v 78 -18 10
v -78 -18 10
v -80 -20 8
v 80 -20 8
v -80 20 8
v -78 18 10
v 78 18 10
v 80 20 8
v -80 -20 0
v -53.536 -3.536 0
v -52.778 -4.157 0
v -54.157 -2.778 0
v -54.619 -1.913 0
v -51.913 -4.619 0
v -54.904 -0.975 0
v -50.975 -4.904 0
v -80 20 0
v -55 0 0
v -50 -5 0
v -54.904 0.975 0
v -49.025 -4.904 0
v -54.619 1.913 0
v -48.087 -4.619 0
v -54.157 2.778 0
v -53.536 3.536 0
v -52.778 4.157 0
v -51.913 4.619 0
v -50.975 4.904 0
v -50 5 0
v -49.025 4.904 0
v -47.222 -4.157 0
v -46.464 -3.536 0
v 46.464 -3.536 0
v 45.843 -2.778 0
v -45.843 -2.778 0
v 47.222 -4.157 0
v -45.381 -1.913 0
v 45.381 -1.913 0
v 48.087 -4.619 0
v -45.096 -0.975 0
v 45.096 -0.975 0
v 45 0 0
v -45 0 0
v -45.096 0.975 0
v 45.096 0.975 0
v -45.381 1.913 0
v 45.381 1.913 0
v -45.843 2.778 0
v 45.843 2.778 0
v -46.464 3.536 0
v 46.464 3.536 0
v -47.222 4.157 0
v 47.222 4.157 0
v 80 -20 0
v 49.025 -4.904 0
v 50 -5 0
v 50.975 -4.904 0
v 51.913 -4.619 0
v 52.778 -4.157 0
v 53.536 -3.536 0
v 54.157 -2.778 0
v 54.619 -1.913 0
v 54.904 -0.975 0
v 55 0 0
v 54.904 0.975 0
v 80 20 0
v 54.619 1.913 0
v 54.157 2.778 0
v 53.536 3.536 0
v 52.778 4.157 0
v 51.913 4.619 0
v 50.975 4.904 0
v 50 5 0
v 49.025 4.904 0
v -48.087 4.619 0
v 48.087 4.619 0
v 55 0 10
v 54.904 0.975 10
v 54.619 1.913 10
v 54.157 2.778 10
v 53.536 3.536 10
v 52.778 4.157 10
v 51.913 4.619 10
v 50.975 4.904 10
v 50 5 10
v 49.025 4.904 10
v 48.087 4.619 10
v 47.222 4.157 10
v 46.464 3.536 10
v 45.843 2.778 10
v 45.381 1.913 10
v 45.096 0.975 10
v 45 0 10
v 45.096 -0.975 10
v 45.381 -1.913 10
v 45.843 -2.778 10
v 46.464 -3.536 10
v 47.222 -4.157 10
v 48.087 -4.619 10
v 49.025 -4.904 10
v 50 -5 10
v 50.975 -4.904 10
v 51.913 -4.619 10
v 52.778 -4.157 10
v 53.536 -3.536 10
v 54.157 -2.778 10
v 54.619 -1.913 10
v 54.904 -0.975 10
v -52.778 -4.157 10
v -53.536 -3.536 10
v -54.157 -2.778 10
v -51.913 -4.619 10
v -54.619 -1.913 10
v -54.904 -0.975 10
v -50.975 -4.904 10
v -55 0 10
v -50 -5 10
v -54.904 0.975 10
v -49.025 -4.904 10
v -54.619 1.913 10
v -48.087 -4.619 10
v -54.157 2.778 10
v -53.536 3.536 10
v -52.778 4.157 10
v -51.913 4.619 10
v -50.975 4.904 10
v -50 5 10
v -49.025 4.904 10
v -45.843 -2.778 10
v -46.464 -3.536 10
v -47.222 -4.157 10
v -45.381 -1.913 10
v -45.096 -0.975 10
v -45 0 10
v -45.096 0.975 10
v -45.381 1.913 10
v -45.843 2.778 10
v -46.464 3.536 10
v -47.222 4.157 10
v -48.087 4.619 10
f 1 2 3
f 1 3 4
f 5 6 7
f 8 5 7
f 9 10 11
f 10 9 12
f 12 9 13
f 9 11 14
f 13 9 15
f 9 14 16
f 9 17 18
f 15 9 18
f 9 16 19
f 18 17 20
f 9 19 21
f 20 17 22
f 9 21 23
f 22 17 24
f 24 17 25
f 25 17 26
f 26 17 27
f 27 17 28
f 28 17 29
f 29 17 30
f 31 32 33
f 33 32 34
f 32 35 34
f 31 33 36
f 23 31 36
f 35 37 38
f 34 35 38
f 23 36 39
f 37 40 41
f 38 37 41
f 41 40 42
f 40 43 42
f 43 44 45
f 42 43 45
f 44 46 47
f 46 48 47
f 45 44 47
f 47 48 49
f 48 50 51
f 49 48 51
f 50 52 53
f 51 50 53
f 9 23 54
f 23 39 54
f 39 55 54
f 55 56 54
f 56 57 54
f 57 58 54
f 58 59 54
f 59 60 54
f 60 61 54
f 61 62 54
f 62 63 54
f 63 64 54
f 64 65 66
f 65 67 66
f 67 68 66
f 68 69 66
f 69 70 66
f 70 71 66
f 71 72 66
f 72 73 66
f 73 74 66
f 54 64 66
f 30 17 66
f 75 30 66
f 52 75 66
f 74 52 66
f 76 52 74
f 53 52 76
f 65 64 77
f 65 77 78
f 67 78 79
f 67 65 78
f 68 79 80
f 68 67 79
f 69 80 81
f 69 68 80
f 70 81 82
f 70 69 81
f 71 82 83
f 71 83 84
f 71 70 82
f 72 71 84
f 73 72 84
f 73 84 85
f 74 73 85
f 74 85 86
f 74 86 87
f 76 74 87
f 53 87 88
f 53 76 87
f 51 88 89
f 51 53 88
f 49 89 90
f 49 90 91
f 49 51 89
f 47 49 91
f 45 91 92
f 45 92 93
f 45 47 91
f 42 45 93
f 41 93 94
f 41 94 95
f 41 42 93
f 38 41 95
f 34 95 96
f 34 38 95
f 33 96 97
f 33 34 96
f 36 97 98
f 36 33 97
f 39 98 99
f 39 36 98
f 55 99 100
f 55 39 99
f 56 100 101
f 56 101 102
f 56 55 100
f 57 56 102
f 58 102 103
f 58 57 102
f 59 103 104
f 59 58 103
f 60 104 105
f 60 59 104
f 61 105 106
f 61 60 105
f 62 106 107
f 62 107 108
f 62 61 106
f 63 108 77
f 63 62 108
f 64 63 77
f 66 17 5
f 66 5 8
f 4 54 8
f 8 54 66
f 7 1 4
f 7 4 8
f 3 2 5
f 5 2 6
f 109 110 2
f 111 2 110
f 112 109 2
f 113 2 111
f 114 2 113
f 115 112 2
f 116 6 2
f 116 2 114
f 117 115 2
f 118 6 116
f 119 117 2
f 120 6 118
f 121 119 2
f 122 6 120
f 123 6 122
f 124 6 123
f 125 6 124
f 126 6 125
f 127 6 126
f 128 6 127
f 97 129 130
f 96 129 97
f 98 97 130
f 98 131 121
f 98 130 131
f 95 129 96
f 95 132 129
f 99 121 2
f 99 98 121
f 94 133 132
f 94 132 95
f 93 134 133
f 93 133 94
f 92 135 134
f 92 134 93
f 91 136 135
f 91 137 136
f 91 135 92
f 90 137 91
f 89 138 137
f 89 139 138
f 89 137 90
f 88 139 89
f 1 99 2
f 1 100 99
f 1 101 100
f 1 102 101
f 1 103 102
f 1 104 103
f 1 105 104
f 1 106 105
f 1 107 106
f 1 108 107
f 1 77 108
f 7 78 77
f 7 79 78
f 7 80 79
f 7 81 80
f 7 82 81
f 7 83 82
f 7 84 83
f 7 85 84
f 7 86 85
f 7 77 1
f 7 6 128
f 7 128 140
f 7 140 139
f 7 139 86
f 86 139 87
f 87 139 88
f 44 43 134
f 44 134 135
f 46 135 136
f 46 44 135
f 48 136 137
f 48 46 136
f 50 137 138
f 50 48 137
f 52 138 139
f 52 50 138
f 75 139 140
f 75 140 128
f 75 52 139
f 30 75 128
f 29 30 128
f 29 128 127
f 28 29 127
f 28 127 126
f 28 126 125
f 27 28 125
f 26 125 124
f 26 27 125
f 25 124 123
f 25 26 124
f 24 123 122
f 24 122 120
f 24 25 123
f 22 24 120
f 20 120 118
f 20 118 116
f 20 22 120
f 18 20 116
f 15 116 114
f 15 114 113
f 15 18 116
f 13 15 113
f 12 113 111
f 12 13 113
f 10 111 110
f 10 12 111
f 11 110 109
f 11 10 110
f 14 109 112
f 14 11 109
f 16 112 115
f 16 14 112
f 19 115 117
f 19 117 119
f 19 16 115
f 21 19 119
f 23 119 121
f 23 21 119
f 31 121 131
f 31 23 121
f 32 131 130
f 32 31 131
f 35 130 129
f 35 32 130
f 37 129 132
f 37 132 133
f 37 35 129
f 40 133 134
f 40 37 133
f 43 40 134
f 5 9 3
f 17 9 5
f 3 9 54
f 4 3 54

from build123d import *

# Parameters (mm, degrees)
SKETCH002_W     = 160
SKETCH002_H     = 40
SKETCH002_R     = 5
PAD001_DEPTH    = 10
CHAMFER001_SIZE = 2


with BuildPart() as part:
    # Sketch002 → Pad001 (new body)
    with BuildSketch(Plane.XY):
        Rectangle(SKETCH002_W, SKETCH002_H)
        with Locations((-50, 0)):
            Circle(SKETCH002_R, mode=Mode.SUBTRACT)
        with Locations((50, 0)):
            Circle(SKETCH002_R, mode=Mode.SUBTRACT)
    extrude(amount=PAD001_DEPTH)

    # Chamfer001
    chamfer001_edges = [part.edges().sort_by_distance(p)[0] for p in [
        (-80, 0, 10),
        (0, 20, 10),
        (80, 0, 10),
        (0, -20, 10),
    ]]
    chamfer(chamfer001_edges, length=CHAMFER001_SIZE)


solid = part.part
